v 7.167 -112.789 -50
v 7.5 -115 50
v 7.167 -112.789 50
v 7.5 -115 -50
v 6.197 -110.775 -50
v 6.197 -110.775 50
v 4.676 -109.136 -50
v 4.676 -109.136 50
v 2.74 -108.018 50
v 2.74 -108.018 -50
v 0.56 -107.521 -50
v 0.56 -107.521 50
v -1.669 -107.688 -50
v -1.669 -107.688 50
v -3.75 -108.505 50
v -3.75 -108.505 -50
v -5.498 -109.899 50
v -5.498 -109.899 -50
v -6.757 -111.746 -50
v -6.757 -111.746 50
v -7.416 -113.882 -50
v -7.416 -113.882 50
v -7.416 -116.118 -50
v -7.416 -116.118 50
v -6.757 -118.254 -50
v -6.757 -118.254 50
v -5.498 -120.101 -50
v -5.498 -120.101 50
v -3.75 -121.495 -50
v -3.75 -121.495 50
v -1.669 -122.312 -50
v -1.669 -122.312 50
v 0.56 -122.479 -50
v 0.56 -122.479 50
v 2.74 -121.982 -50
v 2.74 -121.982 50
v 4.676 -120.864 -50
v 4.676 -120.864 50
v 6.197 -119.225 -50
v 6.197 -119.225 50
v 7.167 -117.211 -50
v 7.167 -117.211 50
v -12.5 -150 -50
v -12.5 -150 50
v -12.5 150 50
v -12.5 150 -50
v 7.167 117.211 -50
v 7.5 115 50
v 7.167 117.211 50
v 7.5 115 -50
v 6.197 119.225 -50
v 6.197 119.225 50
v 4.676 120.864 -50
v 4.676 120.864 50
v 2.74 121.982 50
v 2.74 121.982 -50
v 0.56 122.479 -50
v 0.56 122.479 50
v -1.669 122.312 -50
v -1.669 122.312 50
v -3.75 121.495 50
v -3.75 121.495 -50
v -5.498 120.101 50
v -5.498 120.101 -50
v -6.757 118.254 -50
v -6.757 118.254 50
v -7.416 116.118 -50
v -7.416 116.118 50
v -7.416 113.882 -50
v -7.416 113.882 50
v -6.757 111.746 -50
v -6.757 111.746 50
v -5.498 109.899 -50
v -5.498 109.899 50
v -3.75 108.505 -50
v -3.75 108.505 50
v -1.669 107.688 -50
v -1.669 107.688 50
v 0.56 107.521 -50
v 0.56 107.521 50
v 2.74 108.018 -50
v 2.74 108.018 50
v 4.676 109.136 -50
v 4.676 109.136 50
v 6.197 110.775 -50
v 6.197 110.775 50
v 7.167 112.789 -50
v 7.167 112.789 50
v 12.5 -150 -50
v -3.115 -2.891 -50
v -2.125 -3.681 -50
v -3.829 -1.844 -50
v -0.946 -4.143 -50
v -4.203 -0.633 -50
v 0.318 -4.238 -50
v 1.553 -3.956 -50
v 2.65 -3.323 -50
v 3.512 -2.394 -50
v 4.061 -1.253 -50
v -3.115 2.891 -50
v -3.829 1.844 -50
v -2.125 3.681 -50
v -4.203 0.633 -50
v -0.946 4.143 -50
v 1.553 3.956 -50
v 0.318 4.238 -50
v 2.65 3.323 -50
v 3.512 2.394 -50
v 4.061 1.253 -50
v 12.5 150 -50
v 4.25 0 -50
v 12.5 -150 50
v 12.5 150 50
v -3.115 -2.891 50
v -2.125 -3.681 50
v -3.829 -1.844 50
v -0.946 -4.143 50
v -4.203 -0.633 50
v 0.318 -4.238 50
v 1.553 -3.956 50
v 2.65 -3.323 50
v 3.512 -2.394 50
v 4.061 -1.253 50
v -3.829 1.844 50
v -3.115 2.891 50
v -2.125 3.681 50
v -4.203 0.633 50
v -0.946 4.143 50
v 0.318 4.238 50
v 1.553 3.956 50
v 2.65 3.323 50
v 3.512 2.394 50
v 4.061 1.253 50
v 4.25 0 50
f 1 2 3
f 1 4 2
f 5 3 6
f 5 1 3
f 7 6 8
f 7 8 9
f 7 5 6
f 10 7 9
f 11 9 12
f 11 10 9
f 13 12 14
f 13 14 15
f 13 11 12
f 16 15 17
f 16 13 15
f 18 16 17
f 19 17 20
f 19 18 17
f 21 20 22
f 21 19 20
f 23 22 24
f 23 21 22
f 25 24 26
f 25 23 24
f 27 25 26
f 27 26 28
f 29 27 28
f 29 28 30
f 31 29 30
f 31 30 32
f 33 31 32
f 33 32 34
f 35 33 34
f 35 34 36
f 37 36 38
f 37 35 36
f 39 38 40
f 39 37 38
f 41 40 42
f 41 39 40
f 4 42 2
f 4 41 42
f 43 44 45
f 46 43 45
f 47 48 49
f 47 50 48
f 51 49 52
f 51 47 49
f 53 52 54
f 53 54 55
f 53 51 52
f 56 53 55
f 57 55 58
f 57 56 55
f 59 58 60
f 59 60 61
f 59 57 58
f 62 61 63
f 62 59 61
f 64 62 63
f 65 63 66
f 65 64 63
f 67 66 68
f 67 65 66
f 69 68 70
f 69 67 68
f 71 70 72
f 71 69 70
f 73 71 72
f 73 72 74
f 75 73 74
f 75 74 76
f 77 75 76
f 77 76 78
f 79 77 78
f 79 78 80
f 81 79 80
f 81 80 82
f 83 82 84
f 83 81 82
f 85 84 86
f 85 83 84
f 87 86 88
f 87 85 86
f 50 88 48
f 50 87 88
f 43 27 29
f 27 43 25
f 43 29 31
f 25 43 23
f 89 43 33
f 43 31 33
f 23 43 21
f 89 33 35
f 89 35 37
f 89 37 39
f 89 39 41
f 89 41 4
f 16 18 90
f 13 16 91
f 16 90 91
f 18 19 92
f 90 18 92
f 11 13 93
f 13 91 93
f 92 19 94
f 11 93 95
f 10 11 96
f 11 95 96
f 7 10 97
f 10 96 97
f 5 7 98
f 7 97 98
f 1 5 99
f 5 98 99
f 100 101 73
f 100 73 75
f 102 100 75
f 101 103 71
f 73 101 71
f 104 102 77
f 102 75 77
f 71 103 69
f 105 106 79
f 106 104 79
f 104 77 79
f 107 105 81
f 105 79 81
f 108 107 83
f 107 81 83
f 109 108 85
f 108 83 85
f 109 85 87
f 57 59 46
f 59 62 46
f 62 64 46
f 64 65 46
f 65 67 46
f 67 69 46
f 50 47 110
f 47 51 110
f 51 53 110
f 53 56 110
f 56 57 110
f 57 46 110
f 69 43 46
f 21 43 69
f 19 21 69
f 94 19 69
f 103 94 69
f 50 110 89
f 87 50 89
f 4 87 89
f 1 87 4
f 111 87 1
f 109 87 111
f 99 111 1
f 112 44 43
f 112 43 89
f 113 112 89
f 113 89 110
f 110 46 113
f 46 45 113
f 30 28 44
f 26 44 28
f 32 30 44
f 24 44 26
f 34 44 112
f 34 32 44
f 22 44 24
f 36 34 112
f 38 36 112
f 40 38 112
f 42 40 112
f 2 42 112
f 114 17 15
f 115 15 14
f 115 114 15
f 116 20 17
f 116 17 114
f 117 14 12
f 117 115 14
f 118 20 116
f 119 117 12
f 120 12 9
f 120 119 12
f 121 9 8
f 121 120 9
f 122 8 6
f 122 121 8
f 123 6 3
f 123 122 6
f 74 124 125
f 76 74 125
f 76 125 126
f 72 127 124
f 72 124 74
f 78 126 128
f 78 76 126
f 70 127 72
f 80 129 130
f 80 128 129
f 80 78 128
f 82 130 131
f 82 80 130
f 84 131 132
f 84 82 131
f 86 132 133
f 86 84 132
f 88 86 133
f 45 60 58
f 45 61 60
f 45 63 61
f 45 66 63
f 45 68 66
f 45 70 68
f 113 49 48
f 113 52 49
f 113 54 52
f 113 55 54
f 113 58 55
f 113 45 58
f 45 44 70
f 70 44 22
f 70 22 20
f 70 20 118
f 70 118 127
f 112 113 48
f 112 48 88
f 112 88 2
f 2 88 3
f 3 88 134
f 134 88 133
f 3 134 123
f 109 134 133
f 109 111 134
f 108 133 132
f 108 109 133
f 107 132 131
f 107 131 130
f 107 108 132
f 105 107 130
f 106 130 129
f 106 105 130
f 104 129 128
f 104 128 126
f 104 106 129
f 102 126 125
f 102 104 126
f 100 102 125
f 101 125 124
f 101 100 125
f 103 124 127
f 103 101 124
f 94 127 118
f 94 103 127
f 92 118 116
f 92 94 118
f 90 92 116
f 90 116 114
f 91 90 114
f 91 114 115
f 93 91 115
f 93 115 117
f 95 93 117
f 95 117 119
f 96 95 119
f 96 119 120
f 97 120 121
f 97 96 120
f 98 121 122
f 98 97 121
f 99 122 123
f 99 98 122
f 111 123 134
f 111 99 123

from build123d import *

# Parameters (mm, degrees)
F0_W     = 25
F0_H     = 300
F0_R     = 7.5
F0_R_2   = 4.25
F1_DEPTH = 50


with BuildPart() as f1:
    # F0 (on Top) → F1 (new body, symmetric)
    with BuildSketch(Plane.XY):
        Rectangle(F0_W, F0_H)
        with Locations((0, -115)):
            Circle(F0_R, mode=Mode.SUBTRACT)
        Circle(F0_R_2, mode=Mode.SUBTRACT)
        with Locations((0, 115)):
            Circle(F0_R, mode=Mode.SUBTRACT)
    extrude(amount=F1_DEPTH, both=True)


solid = f1.part
